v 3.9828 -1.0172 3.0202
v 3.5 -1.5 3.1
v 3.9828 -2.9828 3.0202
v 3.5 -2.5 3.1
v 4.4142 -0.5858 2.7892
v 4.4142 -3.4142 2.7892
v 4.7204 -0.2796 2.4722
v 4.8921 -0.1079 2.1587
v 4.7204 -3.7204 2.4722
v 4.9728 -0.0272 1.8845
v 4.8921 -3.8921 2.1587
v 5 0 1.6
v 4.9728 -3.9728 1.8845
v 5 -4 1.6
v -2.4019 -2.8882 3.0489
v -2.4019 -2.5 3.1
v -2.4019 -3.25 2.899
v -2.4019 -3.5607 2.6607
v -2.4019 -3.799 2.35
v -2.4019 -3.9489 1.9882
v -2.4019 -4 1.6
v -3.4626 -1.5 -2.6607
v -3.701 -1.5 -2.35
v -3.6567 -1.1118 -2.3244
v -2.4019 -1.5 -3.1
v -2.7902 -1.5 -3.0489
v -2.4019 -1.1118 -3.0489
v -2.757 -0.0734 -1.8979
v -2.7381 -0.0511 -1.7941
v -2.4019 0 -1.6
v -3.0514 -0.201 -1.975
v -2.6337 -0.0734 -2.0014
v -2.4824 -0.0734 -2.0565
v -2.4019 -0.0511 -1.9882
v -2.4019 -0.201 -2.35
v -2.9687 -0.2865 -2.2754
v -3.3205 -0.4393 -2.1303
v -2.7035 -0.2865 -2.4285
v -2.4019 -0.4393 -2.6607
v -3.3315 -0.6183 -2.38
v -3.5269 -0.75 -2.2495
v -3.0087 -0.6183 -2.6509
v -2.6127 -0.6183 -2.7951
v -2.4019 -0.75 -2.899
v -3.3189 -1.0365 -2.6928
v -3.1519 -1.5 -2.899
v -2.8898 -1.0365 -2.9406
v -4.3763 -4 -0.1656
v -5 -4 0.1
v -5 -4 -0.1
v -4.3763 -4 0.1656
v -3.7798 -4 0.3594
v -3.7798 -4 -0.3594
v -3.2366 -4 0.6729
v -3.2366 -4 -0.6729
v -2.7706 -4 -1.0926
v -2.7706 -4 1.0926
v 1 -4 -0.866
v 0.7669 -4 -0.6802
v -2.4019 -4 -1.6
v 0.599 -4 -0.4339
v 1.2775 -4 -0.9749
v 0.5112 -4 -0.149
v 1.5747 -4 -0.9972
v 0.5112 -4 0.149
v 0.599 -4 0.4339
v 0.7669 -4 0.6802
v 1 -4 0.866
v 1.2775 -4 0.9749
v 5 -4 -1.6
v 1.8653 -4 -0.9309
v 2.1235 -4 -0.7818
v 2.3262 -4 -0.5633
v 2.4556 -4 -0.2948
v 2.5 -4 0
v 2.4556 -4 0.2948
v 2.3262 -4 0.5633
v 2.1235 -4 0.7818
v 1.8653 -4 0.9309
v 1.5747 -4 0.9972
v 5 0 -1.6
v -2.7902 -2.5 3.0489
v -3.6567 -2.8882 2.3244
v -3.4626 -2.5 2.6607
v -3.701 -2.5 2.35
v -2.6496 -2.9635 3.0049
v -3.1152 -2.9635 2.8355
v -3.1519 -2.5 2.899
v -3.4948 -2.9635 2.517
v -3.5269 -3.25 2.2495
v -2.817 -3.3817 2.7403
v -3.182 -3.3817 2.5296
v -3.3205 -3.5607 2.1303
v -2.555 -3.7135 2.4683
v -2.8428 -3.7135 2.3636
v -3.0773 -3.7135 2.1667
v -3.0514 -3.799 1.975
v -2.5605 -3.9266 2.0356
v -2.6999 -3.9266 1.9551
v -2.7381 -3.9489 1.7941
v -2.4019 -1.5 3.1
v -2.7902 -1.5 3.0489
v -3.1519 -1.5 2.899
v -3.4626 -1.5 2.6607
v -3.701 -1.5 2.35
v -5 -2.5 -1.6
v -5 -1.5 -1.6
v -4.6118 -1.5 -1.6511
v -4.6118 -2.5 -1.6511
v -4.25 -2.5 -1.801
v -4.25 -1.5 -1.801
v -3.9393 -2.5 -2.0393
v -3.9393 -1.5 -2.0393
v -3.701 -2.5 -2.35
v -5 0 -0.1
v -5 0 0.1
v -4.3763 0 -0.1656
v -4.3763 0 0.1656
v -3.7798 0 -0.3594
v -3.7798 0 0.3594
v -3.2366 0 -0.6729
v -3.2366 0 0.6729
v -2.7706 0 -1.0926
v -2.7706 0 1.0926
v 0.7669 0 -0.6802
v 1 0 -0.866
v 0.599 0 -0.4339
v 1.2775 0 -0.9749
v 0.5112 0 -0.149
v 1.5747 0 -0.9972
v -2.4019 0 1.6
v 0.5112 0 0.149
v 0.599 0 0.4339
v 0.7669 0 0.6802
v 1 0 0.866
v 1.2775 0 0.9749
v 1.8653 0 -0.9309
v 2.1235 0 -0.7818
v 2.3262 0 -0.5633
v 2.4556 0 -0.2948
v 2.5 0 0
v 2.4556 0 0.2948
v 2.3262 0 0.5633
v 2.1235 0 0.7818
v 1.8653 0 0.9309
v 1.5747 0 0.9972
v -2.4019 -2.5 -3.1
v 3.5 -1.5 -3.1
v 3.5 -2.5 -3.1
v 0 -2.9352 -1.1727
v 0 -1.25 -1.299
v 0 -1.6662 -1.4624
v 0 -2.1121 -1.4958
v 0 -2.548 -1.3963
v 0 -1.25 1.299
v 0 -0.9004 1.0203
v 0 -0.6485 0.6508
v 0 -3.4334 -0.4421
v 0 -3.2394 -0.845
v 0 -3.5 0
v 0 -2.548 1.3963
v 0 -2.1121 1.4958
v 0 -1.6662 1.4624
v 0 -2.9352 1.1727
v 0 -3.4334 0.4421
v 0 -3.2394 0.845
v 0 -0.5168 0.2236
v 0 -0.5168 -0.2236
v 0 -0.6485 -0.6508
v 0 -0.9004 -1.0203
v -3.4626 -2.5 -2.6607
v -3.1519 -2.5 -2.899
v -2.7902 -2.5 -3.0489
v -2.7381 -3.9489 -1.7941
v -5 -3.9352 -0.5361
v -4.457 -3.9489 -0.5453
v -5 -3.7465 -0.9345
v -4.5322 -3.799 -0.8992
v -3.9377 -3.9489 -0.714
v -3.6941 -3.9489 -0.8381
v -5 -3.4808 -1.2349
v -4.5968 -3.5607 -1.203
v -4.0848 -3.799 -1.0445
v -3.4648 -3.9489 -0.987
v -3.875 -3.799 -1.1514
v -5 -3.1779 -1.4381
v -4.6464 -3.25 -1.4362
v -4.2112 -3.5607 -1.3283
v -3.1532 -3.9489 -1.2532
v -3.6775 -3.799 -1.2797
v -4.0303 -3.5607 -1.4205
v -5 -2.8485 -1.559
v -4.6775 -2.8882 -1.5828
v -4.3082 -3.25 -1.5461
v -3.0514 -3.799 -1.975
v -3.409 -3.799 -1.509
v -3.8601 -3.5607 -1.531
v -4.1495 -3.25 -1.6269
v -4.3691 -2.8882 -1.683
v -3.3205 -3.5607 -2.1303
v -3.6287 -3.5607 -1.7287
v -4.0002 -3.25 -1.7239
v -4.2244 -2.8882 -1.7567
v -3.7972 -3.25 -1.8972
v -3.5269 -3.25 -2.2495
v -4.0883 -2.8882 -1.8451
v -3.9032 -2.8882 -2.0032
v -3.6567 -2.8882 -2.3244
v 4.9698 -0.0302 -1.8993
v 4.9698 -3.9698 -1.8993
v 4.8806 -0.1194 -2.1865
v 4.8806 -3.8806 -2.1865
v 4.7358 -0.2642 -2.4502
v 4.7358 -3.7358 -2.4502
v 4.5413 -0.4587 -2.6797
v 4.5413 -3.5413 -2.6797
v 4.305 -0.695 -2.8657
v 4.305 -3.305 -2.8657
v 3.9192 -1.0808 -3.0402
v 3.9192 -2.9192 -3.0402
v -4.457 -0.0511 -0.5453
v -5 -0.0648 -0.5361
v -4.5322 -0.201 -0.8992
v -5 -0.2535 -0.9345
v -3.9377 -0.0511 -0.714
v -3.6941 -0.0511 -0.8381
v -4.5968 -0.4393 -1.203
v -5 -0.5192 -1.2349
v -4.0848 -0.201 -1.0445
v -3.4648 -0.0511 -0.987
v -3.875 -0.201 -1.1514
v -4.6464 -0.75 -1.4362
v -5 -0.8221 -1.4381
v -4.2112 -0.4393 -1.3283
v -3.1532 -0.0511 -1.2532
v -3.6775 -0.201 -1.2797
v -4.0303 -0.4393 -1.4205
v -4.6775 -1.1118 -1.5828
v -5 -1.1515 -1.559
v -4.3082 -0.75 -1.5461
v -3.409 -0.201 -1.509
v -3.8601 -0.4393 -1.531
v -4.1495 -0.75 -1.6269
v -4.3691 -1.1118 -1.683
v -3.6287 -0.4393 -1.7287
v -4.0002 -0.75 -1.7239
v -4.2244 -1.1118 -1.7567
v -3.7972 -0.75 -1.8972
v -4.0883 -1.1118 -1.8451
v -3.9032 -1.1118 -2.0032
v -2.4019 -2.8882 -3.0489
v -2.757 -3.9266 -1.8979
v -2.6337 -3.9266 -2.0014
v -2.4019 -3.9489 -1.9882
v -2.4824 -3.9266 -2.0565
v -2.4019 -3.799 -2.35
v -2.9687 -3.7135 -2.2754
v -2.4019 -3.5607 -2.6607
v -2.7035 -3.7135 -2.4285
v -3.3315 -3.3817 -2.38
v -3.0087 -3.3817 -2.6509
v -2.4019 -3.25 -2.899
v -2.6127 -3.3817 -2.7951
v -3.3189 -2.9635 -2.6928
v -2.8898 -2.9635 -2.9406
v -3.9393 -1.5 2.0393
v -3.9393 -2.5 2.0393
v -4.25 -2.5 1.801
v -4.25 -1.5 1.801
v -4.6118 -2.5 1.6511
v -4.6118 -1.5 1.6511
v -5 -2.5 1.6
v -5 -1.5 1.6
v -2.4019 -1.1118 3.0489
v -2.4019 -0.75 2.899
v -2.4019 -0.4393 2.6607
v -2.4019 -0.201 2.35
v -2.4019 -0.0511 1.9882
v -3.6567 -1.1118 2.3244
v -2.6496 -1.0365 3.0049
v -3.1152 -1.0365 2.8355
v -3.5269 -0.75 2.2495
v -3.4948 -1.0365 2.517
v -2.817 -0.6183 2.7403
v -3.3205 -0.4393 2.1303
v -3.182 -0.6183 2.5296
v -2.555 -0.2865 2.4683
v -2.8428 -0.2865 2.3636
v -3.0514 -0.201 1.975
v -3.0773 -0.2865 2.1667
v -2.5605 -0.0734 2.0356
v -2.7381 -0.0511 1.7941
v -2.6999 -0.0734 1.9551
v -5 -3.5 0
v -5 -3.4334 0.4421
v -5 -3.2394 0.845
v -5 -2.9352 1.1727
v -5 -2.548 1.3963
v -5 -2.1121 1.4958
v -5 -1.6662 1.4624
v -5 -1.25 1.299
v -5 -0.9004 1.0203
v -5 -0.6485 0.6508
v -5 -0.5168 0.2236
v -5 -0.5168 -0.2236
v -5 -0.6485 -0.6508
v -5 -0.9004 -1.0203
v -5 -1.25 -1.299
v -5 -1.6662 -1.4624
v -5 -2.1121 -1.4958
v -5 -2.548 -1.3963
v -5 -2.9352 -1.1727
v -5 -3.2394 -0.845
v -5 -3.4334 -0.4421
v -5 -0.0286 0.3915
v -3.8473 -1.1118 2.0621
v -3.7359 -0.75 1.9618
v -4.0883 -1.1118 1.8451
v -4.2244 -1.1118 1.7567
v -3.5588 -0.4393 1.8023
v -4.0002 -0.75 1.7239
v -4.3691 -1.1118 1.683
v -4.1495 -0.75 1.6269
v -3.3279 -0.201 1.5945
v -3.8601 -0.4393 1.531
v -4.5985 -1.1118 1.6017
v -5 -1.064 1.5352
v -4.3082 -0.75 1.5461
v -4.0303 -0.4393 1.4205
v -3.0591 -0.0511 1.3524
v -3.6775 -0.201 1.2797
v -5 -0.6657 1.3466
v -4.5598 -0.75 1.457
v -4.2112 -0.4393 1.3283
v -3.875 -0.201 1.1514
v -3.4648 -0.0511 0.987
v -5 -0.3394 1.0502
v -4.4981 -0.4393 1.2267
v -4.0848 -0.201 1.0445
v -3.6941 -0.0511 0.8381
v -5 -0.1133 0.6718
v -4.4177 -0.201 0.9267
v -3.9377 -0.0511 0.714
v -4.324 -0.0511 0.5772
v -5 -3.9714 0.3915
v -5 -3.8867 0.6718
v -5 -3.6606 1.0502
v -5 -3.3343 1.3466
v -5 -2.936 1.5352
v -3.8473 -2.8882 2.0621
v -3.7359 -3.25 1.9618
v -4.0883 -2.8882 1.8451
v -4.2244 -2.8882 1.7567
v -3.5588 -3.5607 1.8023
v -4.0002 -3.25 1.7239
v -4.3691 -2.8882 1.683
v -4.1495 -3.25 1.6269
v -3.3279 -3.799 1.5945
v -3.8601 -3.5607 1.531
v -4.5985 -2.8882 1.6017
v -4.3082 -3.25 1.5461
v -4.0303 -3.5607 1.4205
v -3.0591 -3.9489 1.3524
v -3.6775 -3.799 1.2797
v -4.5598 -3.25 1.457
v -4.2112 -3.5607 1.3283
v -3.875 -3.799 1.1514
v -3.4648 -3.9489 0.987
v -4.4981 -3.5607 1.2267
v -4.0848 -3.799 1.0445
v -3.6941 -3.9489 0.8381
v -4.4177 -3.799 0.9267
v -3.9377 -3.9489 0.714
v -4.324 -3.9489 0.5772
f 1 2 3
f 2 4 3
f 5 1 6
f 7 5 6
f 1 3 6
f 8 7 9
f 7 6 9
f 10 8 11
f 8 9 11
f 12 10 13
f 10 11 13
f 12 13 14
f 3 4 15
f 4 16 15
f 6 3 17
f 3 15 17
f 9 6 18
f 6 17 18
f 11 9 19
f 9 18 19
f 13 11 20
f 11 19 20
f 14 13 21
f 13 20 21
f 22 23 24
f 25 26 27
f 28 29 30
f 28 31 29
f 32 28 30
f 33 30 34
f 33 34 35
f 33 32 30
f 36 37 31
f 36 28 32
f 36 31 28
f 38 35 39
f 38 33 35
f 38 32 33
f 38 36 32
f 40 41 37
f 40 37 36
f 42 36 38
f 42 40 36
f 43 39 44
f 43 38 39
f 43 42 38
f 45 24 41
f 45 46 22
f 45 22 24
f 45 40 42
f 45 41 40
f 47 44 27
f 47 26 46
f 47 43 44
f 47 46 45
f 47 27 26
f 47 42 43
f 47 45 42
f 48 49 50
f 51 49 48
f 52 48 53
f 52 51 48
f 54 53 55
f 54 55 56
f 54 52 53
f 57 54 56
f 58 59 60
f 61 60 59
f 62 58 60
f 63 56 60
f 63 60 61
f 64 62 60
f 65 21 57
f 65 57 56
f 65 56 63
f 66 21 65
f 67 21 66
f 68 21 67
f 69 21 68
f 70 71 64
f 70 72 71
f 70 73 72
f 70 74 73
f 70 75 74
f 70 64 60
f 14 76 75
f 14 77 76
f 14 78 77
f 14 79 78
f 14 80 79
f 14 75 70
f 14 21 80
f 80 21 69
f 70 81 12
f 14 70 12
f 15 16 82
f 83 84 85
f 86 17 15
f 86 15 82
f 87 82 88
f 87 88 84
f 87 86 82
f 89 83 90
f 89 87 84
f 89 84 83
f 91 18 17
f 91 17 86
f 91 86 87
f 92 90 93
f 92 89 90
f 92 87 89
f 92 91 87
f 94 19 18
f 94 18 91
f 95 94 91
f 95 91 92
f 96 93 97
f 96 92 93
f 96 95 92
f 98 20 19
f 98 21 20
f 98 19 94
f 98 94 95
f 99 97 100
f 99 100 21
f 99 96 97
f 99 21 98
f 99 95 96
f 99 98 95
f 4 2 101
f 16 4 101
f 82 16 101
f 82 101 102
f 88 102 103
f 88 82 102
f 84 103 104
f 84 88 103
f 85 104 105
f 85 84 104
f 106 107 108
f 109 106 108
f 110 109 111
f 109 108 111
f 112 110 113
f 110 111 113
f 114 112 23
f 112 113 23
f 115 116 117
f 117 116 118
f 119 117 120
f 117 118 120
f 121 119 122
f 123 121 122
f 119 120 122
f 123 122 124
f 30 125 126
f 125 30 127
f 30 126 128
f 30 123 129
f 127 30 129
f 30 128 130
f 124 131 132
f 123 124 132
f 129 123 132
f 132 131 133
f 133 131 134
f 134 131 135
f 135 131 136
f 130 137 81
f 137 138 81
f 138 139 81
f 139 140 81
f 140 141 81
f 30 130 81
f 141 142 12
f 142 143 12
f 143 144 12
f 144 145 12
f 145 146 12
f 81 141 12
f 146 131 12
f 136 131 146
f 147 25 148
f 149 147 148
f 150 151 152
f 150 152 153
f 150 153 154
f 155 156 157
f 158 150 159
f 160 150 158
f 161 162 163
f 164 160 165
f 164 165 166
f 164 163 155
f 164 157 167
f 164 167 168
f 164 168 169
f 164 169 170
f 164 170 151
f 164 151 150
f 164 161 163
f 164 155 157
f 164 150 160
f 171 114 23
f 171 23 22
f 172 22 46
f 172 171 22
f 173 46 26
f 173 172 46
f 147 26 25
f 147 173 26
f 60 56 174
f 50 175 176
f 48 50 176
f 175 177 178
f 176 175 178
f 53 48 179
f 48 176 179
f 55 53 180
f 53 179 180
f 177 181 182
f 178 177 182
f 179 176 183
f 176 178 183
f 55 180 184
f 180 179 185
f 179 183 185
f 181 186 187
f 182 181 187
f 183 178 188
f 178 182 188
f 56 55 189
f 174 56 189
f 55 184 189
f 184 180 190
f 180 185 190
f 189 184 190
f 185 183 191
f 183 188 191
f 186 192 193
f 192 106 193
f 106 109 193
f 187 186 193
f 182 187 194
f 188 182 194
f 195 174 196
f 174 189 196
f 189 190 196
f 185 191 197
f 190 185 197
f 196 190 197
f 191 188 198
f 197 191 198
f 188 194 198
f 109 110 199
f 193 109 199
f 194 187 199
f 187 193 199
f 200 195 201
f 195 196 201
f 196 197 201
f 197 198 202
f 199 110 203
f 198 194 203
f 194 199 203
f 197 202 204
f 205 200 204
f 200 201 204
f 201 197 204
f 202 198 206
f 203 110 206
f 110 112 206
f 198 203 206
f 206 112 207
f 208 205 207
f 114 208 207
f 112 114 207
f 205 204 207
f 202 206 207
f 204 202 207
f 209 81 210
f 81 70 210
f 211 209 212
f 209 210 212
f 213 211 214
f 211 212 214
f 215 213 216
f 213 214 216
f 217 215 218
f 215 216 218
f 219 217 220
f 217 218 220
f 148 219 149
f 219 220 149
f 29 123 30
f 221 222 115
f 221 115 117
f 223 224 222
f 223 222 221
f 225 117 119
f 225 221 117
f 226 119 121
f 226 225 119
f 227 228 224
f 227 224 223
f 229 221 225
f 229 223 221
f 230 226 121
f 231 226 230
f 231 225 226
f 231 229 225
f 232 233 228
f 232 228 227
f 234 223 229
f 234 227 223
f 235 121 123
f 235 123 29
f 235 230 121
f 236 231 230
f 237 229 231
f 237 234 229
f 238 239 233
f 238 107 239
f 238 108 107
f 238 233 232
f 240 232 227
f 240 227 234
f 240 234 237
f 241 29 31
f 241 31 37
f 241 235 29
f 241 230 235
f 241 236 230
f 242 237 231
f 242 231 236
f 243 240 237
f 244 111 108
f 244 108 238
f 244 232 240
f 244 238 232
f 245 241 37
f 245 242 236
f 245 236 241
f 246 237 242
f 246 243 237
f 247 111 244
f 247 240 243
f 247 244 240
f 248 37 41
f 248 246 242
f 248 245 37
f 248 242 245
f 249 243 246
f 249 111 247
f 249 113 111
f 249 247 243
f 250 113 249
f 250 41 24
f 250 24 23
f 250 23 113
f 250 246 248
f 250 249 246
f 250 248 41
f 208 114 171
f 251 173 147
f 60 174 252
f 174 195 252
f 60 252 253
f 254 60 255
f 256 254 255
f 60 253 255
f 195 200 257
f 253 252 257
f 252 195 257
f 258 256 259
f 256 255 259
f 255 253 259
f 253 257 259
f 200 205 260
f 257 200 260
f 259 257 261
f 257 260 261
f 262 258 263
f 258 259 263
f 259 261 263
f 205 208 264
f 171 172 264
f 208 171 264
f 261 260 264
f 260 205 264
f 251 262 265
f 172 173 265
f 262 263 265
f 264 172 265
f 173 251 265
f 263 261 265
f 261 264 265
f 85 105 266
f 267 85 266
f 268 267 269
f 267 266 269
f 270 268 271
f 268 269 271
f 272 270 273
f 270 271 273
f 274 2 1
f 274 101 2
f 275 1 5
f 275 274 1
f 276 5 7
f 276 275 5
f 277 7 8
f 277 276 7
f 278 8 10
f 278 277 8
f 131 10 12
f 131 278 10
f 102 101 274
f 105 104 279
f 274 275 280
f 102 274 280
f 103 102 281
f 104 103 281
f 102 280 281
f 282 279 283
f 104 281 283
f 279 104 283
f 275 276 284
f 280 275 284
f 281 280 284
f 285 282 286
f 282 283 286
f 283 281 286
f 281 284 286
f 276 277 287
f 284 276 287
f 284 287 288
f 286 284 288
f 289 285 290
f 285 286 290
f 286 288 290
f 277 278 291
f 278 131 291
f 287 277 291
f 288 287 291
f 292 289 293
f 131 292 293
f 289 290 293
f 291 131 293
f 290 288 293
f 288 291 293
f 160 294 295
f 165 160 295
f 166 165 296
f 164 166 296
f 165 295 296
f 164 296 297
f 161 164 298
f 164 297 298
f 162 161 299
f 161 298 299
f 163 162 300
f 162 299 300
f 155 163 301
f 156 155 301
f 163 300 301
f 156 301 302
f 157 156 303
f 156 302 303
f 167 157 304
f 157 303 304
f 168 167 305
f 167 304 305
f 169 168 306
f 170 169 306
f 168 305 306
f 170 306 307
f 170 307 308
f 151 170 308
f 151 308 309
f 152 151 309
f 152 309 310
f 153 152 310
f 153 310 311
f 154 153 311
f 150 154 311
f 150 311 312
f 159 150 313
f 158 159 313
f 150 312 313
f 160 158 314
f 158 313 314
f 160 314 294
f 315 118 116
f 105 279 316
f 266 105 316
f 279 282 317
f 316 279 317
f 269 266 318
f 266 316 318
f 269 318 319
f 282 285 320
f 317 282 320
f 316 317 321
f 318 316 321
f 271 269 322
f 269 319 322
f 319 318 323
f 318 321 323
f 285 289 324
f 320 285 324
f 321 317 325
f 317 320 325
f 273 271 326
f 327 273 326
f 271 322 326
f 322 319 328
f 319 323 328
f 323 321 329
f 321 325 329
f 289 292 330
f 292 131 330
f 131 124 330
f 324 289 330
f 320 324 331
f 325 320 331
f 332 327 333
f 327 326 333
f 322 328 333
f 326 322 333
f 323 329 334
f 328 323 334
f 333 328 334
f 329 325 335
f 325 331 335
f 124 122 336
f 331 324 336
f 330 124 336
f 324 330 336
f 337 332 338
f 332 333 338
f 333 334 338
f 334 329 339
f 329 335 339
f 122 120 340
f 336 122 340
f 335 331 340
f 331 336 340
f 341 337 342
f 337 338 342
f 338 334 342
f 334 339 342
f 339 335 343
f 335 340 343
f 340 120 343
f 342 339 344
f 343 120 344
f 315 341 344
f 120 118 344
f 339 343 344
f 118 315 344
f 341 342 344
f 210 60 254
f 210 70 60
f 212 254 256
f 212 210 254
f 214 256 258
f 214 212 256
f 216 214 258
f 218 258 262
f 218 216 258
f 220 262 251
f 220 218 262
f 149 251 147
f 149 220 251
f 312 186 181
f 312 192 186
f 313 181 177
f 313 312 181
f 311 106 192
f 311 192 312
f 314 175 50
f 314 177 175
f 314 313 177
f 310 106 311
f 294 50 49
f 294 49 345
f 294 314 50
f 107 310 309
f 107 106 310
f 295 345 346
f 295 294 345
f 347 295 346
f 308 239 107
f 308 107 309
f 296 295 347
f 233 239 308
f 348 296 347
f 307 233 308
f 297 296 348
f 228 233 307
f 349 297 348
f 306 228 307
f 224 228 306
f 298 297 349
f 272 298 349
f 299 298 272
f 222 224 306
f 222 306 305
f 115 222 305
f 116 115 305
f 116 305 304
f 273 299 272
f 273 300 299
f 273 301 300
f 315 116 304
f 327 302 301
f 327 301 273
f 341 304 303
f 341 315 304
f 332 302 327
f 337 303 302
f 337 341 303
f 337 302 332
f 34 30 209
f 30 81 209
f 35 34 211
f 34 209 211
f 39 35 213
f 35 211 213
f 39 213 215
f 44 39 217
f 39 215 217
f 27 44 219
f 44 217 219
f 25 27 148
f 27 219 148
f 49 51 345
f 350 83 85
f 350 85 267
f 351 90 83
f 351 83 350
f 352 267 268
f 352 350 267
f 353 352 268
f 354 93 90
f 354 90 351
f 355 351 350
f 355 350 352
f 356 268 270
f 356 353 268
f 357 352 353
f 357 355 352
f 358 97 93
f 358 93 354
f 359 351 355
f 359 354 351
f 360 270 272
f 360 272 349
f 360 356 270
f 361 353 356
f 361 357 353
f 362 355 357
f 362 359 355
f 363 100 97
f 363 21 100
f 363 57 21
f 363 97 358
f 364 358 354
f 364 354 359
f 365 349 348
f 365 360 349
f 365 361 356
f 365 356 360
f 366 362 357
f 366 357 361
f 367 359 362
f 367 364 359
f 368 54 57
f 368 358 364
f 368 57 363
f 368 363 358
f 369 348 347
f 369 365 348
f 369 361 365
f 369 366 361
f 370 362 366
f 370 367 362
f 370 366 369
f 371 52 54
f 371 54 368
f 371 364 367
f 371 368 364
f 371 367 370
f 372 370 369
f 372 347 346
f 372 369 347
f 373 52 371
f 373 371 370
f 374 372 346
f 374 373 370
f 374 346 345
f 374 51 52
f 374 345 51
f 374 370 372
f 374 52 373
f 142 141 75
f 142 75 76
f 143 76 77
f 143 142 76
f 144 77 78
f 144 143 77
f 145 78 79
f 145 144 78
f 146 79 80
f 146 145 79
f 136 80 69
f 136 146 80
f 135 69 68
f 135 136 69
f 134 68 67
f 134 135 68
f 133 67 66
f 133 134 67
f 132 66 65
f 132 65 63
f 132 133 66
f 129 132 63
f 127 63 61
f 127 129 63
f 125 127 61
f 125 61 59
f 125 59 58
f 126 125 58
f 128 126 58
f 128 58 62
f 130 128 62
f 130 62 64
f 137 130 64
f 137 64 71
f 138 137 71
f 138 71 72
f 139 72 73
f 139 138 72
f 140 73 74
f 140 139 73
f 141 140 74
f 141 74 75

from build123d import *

# Parameters (mm, degrees)
F0_R     = 1
F0_W     = 5
F0_H     = 3.2
F1_DEPTH = 4
F2_R     = 1.5
F3_R     = 1.5
F4_DEPTH = 5
F5_R     = 1.5


with BuildPart() as f1:
    # F0 (on Front) → F1 (new body)
    with BuildSketch(Plane.XZ):
        with BuildLine():
            Line((5, 3.1), (-3.5, 3.1))
            ThreePointArc((-3.5, 3.1), (-3.93934, 2.03934), (-5, 1.6))
            Line((-5, 1.6), (0, 1.6))
            Line((0, 1.6), (0, -1.6))
            Line((0, -1.6), (-5, -1.6))
            ThreePointArc((-5, -1.6), (-3.93934, -2.03934), (-3.5, -3.1))
            Line((-3.5, -3.1), (5, -3.1))
            Line((5, -3.1), (5, 3.1))
        make_face()
        with Locations((1.5, 0)):
            Circle(F0_R, mode=Mode.SUBTRACT)
        with Locations((-2.5, 0)):
            Rectangle(F0_W, F0_H)
    extrude(amount=F1_DEPTH)

    # F2
    f2_edges = [f1.edges().sort_by_distance(p)[0] for p in [
        (-3.5, -2, 3.1),
        (-3.5, -2, -3.1),
    ]]
    fillet(f2_edges, radius=F2_R)

    # F3 (on face) → F4 (cut)
    with BuildSketch(Plane(origin=(-5, 0, 0), x_dir=(0, -1, 0), z_dir=(-1, 0, 0))):
        with Locations((2, 0)):
            Circle(F3_R)
    extrude(amount=-F4_DEPTH, mode=Mode.SUBTRACT)

    # F5
    f5_edges = [f1.edges().sort_by_distance(p)[0] for p in [
        (5, -2, 3.1),
        (1.299038, -4, 3.1),
        (1.299038, 0, 3.1),
        (5, -2, -3.1),
        (1.299038, -4, -3.1),
        (1.299038, 0, -3.1),
    ]]
    fillet(f5_edges, radius=F5_R)


solid = f1.part
